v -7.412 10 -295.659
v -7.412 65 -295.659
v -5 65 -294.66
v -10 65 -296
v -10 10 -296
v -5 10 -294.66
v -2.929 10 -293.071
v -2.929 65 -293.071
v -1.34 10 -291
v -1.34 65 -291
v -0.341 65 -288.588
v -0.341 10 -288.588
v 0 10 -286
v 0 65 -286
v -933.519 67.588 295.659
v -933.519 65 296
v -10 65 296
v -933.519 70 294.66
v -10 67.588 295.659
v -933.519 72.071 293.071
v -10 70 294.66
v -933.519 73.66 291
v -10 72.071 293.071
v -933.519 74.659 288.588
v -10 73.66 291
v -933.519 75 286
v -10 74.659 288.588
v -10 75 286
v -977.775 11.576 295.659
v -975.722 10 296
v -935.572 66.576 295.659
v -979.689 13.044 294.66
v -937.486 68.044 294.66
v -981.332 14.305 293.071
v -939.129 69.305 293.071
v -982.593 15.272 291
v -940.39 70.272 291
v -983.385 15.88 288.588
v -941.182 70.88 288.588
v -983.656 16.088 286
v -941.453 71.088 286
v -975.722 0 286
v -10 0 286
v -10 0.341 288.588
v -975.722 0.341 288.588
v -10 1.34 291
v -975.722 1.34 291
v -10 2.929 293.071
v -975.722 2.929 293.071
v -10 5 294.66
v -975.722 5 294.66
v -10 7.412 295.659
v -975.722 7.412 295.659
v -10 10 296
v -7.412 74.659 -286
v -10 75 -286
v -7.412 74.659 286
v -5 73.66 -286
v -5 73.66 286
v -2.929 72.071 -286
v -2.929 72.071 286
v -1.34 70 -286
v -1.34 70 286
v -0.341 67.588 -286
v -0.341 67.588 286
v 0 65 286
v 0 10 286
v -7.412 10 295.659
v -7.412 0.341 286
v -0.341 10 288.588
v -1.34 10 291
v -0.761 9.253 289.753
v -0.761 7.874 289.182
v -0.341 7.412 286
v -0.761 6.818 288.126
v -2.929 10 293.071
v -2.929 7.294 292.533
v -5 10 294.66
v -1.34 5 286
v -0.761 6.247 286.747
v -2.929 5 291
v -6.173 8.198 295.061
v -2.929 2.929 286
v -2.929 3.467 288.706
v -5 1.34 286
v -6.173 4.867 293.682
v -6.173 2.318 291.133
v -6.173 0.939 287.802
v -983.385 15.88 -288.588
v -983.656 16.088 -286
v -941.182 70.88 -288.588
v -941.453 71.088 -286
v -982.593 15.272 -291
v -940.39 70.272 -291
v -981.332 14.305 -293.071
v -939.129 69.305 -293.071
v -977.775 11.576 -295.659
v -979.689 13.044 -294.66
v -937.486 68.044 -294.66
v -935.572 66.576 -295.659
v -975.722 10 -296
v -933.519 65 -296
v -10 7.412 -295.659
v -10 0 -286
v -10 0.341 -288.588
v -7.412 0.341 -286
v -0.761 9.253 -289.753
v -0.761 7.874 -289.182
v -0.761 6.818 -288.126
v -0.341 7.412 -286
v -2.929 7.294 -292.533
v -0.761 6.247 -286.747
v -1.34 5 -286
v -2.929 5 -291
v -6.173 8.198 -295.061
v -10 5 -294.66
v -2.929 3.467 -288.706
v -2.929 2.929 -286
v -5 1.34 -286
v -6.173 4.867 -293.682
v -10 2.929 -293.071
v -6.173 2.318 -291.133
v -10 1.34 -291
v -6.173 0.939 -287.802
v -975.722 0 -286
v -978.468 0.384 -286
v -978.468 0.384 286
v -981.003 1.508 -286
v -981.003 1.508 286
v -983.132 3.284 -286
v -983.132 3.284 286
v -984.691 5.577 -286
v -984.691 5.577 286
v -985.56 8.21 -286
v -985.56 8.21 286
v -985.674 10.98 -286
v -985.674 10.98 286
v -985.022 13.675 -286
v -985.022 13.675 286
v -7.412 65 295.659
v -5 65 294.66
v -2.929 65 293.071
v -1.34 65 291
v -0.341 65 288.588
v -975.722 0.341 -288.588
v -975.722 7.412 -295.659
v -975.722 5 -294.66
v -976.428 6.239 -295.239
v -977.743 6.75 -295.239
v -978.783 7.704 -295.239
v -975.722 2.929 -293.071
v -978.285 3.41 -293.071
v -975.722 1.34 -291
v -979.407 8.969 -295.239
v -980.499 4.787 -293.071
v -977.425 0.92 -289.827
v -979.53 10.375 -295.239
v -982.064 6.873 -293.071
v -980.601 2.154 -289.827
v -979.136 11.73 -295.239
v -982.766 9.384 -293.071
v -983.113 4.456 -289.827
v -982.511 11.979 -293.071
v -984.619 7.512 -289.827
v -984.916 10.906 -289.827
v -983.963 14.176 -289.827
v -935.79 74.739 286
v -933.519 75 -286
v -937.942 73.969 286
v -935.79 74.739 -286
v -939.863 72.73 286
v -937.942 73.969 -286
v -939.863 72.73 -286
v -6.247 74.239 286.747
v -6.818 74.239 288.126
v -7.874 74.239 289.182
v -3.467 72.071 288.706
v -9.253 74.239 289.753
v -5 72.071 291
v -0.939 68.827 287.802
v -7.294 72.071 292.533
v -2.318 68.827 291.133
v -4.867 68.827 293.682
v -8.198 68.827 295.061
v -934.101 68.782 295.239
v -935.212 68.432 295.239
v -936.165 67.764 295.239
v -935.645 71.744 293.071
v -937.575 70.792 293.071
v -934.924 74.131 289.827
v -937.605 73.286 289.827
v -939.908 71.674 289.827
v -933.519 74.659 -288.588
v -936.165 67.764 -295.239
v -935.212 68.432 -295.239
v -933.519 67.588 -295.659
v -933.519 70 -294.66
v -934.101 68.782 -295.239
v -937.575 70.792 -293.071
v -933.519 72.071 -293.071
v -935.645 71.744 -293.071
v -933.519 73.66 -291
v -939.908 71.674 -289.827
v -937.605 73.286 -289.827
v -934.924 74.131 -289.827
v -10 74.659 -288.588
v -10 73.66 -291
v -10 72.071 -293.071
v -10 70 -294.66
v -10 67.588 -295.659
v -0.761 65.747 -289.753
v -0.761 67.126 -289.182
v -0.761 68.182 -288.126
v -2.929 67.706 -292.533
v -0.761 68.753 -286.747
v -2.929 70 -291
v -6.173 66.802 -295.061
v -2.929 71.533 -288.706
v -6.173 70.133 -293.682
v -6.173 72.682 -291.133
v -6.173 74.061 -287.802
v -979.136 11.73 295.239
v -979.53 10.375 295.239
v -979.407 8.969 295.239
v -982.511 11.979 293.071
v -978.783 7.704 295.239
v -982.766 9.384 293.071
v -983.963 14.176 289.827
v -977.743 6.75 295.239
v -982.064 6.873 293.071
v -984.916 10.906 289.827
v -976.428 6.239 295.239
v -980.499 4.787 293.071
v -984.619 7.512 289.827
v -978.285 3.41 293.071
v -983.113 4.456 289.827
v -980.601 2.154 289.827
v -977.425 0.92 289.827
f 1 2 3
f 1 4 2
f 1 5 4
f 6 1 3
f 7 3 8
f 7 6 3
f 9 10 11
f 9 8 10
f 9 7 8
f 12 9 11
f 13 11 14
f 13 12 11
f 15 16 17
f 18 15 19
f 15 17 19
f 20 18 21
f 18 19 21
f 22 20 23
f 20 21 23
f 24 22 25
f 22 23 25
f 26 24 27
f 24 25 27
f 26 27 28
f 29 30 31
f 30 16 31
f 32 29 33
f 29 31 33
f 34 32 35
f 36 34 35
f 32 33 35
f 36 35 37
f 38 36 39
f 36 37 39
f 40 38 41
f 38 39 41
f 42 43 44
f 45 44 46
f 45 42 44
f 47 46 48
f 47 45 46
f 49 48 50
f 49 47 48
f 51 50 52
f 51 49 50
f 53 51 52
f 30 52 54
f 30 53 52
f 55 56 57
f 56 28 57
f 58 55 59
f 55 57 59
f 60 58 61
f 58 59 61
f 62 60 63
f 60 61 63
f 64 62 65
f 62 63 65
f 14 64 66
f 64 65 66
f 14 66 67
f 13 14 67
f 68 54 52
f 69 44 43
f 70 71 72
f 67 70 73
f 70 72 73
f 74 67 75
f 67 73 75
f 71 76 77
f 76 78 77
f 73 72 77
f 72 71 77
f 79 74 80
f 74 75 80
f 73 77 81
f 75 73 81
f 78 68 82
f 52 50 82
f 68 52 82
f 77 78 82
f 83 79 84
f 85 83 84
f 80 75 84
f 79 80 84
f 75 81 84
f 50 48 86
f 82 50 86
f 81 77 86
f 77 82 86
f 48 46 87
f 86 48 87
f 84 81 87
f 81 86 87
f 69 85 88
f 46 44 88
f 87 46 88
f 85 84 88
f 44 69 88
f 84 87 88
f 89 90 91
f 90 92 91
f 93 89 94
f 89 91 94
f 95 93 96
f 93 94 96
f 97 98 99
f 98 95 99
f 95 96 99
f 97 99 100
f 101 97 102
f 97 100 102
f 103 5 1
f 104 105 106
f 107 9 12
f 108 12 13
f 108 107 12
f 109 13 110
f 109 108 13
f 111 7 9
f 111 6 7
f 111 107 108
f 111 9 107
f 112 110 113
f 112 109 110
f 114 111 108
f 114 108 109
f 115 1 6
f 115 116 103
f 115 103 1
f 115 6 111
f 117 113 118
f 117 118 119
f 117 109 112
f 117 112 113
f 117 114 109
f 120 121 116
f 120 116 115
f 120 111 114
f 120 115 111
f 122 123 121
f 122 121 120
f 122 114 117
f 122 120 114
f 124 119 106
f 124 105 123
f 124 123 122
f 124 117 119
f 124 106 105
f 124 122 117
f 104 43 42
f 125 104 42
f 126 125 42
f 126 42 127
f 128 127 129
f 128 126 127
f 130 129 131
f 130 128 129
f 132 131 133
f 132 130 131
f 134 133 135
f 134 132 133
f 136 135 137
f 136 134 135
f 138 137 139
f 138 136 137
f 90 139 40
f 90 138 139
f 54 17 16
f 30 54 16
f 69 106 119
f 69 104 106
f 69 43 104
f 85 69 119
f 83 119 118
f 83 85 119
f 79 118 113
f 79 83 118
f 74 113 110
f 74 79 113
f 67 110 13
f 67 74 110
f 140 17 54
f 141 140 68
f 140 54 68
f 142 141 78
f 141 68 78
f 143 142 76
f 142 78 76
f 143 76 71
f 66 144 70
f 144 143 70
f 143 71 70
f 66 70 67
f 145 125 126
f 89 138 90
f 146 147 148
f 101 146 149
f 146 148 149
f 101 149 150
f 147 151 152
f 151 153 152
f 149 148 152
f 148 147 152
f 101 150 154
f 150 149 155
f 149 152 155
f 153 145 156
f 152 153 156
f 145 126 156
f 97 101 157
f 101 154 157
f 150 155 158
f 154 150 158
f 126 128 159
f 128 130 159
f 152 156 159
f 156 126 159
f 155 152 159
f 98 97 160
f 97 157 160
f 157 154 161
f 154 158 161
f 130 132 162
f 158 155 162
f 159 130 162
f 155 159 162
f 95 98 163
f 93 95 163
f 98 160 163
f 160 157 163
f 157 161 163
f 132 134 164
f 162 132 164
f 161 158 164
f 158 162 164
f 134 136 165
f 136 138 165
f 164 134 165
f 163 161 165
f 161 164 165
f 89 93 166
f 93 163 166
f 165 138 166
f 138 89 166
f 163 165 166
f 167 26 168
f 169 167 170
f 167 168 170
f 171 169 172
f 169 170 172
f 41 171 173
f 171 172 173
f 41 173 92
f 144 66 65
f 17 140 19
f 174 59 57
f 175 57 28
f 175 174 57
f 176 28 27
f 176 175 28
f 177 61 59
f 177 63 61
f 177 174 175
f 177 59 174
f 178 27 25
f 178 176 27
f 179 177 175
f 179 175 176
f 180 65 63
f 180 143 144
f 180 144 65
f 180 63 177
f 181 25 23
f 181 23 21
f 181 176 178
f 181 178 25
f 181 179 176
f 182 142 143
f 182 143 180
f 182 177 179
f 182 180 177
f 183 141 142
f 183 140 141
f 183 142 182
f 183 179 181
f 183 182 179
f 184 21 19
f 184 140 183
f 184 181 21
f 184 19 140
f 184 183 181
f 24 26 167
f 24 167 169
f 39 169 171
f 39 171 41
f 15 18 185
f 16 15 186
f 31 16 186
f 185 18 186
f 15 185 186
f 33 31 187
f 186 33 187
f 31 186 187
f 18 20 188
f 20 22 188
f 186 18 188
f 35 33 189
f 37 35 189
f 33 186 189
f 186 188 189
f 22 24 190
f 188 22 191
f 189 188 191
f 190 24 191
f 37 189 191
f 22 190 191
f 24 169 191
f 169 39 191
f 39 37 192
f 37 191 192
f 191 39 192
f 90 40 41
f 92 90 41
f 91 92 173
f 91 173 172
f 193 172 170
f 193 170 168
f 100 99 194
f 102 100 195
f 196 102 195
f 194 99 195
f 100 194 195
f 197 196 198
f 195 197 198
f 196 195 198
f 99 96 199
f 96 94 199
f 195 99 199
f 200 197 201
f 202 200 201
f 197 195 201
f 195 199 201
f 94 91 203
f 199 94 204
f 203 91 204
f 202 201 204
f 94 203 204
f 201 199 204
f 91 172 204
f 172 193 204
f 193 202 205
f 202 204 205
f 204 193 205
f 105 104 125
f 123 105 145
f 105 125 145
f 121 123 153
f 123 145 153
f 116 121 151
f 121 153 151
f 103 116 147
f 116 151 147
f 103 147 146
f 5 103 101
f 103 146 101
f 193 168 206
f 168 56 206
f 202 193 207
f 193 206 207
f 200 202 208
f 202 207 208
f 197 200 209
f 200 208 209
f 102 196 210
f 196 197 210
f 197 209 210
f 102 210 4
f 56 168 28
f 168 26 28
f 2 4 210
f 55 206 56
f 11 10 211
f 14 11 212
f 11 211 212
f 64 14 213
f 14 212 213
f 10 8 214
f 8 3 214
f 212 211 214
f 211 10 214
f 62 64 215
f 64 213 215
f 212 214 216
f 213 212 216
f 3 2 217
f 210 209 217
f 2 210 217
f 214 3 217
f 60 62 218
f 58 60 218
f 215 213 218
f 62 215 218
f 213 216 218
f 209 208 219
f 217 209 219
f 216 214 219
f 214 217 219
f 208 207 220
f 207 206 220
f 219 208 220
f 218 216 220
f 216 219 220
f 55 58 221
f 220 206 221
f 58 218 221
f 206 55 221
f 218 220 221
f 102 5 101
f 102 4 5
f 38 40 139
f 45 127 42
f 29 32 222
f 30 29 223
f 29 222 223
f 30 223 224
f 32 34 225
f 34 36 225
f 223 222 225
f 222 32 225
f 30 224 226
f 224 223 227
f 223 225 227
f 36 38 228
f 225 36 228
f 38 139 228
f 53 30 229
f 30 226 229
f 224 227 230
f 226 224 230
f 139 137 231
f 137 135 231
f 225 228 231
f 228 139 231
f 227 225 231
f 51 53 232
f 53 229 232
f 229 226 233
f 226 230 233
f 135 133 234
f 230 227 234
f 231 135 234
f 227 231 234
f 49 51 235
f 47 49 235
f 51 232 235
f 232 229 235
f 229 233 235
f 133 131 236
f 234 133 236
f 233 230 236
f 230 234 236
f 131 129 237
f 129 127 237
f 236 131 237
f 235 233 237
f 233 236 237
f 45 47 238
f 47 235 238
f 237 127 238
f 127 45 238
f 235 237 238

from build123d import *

# Parameters (mm, degrees)
BOSS_EXTRUDE1_DEPTH = 296
FILLET1_R           = 10


with BuildPart() as part:
    # Sketch1 → Boss-Extrude1 (new, symmetric)
    with BuildSketch(Plane.XY):
        Polygon((0, 0), (-996, 0), (-938.450475902, 75), (0, 75), align=None)
    extrude(amount=BOSS_EXTRUDE1_DEPTH, both=True)

    # Fillet1
    fillet1_edges = [part.edges().sort_by_distance(p)[0] for p in [
        (-967.225237951, 37.5, 296),
        (-498, 0, 296),
        (0, 37.5, 296),
        (-498, 0, -296),
        (-967.225237951, 37.5, -296),
        (-469.225237951, 75, -296),
        (0, 37.5, -296),
        (0, 0, 0),
        (-996, 0, 0),
        (-938.450475902, 75, 0),
        (0, 75, 0),
        (-469.225237951, 75, 296),
    ]]
    fillet(fillet1_edges, radius=FILLET1_R)


solid = part.part
